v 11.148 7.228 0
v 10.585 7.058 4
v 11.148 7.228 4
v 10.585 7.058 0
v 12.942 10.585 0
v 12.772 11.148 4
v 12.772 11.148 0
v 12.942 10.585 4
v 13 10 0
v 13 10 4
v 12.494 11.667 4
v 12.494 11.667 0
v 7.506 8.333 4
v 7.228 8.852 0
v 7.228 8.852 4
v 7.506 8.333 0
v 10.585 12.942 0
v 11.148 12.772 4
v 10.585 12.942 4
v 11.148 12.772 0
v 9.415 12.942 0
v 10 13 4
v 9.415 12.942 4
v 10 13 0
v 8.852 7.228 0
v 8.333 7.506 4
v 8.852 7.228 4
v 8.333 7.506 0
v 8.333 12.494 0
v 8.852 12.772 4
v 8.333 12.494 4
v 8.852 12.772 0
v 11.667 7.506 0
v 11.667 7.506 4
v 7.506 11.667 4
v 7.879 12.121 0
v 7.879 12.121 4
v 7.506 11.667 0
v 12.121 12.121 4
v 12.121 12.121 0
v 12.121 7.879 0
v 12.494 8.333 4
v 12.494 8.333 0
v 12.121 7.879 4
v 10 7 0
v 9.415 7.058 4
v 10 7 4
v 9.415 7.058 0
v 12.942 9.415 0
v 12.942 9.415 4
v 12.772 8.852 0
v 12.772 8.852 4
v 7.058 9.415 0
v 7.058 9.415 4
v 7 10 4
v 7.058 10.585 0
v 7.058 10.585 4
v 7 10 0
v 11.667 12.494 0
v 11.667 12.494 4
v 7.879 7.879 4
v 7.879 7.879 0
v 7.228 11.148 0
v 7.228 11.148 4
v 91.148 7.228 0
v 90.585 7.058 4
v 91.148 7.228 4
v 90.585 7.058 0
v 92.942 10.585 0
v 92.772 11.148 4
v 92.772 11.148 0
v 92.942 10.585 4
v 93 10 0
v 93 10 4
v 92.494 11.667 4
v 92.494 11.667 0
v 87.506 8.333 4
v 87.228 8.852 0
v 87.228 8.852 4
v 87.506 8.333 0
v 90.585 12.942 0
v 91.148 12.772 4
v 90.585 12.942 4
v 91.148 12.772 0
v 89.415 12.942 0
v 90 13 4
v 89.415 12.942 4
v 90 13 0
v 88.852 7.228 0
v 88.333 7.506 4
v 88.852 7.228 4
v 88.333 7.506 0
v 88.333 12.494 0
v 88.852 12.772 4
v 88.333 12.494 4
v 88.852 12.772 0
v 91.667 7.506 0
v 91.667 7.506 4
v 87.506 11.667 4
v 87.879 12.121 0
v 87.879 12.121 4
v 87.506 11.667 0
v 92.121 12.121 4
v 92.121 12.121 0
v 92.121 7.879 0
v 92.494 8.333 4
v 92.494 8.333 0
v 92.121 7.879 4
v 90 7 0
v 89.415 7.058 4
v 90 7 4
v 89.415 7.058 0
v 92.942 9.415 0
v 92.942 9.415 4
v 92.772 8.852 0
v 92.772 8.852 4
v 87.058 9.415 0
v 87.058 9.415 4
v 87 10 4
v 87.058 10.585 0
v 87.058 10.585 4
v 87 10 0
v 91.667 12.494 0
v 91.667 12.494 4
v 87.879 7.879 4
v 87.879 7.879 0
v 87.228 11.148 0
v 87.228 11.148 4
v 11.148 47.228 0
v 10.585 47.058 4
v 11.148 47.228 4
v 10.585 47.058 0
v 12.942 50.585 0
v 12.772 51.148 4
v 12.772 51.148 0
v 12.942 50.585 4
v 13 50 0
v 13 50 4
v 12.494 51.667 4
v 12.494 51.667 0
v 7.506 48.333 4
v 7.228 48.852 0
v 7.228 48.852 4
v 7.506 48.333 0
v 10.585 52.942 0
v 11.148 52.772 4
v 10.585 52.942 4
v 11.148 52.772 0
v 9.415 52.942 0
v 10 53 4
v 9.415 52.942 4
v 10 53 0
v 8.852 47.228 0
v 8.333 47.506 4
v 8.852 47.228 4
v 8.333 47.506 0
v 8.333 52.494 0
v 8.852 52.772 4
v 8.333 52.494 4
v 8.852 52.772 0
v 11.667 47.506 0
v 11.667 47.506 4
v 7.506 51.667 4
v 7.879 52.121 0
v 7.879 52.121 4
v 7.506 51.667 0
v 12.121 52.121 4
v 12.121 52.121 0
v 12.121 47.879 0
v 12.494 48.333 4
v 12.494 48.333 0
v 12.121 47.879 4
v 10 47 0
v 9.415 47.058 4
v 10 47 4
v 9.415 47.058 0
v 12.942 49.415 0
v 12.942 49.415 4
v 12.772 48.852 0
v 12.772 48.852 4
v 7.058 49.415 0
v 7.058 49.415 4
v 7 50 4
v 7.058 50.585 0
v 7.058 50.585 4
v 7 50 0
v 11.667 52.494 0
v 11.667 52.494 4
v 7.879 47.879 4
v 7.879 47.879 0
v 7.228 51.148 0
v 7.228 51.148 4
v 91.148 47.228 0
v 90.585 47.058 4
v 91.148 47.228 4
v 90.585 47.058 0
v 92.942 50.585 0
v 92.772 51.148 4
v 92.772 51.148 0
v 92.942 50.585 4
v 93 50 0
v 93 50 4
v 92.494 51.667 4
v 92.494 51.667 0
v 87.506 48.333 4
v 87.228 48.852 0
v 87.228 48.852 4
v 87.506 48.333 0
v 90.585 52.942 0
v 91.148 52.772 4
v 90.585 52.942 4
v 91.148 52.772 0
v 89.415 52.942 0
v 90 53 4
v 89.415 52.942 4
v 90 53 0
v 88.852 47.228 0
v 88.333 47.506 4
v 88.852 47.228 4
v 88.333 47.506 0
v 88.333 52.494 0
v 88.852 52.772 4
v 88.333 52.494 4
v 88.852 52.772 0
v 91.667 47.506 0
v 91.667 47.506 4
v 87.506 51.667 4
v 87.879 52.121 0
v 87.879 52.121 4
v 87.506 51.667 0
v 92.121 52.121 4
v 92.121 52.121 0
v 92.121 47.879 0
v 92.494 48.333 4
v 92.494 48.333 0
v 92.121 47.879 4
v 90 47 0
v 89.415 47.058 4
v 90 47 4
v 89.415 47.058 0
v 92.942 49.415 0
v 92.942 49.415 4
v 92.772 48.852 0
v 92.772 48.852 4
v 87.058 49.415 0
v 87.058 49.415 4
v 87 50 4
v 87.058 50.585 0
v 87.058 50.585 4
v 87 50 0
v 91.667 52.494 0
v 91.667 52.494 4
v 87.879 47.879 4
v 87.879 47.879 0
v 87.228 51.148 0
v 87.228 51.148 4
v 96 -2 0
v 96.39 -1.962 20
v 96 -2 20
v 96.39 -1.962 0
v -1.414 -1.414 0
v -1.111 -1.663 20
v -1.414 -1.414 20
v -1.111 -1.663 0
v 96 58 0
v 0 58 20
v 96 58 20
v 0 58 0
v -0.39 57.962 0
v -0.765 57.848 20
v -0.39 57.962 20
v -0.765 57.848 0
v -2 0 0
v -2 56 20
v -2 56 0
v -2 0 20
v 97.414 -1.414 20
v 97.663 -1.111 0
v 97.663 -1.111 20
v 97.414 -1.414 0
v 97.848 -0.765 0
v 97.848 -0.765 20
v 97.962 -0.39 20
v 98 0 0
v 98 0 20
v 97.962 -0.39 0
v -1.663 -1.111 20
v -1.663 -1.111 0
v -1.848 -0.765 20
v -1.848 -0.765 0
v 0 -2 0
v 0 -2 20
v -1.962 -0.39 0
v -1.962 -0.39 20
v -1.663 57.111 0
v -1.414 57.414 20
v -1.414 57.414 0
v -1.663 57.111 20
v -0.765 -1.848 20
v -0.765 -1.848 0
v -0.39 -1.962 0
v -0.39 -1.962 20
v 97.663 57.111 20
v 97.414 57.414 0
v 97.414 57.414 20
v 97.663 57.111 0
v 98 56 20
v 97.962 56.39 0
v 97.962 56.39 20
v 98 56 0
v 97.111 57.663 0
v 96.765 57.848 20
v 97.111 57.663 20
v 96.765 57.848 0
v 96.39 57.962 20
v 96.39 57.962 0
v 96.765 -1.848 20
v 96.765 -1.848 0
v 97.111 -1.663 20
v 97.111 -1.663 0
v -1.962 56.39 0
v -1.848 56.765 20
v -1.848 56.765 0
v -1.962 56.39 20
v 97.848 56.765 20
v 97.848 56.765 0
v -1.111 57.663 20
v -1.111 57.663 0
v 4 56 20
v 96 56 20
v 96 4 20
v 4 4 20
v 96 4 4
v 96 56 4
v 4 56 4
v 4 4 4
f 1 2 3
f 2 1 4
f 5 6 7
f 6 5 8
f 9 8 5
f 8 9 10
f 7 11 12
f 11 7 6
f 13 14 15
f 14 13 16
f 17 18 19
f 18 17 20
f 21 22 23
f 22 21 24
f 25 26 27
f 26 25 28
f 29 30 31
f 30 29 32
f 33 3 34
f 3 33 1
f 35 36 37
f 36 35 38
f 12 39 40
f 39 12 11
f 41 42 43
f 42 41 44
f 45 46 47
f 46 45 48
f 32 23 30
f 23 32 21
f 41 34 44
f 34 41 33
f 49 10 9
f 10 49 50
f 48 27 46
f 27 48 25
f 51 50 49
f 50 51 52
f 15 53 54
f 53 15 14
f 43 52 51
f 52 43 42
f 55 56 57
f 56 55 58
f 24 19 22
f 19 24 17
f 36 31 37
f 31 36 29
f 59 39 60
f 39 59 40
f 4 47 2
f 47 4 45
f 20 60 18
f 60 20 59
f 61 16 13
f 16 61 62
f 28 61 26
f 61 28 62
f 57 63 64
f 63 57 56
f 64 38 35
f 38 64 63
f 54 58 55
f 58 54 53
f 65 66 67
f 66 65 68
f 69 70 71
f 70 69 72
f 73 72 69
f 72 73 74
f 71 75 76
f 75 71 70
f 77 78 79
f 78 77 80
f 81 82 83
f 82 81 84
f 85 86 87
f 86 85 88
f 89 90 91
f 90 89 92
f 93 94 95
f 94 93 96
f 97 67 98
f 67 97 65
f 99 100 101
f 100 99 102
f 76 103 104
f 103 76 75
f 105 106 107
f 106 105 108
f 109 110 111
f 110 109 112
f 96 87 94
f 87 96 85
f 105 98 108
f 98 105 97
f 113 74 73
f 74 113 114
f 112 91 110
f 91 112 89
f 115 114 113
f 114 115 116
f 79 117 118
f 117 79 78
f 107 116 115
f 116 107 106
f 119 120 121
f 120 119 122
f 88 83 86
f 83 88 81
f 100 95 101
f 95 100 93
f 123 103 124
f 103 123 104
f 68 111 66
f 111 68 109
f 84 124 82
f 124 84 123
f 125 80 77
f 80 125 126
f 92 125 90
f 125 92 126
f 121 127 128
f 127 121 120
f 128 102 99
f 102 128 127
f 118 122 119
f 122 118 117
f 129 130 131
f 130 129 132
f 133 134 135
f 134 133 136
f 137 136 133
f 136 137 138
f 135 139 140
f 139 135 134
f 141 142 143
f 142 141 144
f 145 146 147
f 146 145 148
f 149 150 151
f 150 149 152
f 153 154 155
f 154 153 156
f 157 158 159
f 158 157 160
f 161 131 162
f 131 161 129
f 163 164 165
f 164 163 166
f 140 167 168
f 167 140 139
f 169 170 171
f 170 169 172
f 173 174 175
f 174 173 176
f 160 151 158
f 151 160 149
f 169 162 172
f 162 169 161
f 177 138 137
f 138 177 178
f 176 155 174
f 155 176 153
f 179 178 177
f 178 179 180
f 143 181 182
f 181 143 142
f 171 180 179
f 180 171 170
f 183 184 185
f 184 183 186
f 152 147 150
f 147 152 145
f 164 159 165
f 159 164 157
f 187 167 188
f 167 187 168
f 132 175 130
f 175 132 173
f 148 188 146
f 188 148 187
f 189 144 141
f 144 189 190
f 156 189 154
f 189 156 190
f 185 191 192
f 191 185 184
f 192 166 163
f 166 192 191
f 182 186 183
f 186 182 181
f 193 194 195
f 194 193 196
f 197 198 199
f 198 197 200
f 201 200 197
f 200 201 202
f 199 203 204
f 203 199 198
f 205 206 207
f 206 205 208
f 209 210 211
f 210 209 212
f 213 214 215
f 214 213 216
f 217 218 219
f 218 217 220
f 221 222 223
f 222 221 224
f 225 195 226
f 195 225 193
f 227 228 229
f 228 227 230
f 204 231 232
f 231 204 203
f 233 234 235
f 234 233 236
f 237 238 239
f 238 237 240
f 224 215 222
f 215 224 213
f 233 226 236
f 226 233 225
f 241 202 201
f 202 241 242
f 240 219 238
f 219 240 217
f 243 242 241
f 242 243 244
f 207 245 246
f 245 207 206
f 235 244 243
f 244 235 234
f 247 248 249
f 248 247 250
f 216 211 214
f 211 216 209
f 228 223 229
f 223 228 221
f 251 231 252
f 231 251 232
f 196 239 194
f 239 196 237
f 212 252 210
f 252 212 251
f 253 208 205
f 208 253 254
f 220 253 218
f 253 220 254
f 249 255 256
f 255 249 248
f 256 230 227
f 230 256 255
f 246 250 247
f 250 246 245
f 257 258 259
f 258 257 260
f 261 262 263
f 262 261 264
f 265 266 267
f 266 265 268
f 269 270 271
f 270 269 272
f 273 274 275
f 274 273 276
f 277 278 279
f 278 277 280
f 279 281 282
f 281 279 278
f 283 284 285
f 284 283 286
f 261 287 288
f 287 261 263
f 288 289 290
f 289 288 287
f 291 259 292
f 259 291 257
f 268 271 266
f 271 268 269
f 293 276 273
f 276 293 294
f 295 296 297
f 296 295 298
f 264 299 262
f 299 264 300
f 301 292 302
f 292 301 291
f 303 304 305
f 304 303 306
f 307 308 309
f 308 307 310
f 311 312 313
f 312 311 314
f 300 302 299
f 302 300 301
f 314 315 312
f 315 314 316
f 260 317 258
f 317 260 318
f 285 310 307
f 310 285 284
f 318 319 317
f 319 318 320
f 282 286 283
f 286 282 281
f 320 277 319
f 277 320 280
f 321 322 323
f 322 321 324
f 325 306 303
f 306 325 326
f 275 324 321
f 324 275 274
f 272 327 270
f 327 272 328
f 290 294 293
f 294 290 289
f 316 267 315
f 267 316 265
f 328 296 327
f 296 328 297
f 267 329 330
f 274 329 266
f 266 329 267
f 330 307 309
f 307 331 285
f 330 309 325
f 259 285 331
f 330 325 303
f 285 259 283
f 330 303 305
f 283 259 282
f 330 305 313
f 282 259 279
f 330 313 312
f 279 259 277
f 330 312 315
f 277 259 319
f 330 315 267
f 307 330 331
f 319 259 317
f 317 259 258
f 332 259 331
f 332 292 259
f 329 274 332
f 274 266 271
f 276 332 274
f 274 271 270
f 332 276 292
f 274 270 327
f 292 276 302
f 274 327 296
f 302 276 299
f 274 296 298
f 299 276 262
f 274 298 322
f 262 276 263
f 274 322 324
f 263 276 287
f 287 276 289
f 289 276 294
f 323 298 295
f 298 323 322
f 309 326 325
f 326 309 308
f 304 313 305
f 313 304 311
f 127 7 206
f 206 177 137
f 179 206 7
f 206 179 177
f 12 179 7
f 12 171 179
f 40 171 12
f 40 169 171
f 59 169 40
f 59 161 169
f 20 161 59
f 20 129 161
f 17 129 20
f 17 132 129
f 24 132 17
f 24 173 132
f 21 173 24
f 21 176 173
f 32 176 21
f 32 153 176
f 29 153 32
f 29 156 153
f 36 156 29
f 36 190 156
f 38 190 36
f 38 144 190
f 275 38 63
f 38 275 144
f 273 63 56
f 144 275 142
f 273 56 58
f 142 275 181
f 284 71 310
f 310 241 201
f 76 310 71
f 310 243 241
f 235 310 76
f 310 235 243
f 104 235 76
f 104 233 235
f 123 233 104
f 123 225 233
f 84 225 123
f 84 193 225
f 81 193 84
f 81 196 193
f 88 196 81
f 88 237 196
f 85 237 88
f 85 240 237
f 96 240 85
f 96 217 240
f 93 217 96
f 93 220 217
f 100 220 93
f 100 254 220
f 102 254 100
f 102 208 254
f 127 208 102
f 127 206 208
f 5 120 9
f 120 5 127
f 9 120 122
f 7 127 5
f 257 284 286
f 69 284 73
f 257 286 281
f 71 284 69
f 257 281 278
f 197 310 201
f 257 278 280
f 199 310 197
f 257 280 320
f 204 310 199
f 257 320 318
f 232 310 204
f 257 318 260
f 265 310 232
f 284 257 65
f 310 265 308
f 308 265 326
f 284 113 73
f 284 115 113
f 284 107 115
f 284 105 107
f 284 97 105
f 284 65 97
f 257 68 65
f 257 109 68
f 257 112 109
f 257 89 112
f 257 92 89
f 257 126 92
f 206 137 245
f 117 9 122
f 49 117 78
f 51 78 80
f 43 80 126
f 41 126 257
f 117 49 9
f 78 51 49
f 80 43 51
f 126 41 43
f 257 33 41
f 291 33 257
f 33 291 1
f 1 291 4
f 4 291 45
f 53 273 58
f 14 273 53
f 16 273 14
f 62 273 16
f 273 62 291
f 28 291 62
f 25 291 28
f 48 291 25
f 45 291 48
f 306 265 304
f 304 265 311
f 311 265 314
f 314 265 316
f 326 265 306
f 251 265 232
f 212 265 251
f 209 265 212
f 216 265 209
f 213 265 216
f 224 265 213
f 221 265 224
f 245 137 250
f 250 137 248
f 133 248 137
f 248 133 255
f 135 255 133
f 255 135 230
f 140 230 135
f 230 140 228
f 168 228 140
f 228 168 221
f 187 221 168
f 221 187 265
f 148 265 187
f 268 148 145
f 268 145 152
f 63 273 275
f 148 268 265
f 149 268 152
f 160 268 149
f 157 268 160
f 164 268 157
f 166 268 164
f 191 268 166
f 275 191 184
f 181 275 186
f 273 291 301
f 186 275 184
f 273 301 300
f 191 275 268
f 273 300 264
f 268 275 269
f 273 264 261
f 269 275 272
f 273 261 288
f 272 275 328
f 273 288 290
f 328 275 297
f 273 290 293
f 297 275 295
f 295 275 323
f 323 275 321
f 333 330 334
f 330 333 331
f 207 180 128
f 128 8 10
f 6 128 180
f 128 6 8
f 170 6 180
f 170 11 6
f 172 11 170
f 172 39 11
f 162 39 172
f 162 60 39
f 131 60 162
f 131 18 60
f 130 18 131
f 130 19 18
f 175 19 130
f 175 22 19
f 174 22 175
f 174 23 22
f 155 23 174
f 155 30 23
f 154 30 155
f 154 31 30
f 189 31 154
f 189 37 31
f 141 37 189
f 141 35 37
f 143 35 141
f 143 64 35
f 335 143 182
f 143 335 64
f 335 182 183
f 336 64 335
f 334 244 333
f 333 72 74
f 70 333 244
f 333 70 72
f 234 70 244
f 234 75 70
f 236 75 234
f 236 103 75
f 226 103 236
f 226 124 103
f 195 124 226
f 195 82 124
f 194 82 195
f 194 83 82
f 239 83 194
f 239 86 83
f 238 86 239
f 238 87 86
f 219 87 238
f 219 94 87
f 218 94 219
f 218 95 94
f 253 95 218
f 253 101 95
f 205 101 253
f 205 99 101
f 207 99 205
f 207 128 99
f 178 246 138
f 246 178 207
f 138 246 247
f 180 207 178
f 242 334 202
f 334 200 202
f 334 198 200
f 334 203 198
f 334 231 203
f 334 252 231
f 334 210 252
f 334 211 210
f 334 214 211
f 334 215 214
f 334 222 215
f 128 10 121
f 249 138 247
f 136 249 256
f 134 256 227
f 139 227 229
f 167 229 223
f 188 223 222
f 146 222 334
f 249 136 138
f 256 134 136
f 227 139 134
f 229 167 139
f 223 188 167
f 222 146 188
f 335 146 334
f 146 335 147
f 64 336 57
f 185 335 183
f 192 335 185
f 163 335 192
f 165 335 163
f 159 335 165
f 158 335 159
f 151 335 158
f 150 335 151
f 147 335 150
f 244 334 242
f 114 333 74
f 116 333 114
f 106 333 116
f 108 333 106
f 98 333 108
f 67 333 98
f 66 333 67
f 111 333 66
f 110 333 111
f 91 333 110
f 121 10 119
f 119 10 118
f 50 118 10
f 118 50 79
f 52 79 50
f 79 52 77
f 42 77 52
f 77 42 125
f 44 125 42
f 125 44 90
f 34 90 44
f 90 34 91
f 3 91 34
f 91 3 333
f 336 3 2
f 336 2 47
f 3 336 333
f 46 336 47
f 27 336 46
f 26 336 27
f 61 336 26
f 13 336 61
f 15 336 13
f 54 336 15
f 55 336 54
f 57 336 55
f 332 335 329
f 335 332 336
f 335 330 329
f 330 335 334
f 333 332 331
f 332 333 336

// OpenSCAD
// scad/base_part.scad
// Parametric mounting bracket.
// All caps variables are injected via -D flags from openscad_runner.py.
// Do not hardcode dimensions here — edit scad/params.json instead.

// ── Parameters (defaults match scad/params.json) ──────────────────────────
LENGTH                 = 100.0;
WIDTH                  = 60.0;
HEIGHT                 = 20.0;
WALL_THICKNESS         = 4.0;
FILLET_RADIUS          = 2.0;
MOUNTING_HOLE_DIAMETER = 6.0;
MOUNTING_HOLE_INSET    = 10.0;

// ── Derived values ─────────────────────────────────────────────────────────
hole_r   = MOUNTING_HOLE_DIAMETER / 2;
fn_curve = 32;  // cylinder facets — increase for smoother export

// ── Main body ──────────────────────────────────────────────────────────────
module body() {
    minkowski() {
        cube([
            LENGTH - 2 * FILLET_RADIUS,
            WIDTH  - 2 * FILLET_RADIUS,
            HEIGHT - FILLET_RADIUS
        ]);
        cylinder(r=FILLET_RADIUS, h=FILLET_RADIUS, $fn=fn_curve);
    }
}

// ── Mounting holes (4 corners) ─────────────────────────────────────────────
module mounting_holes() {
    inset = MOUNTING_HOLE_INSET;
    positions = [
        [inset,          inset         ],
        [LENGTH - inset, inset         ],
        [inset,          WIDTH - inset ],
        [LENGTH - inset, WIDTH - inset ],
    ];
    for (pos = positions) {
        translate([pos[0], pos[1], -1])
            cylinder(r=hole_r, h=HEIGHT + 2, $fn=fn_curve);
    }
}

// ── Hollowed interior (shell thickness = WALL_THICKNESS) ───────────────────
module hollow() {
    translate([WALL_THICKNESS, WALL_THICKNESS, WALL_THICKNESS])
        cube([
            LENGTH - 2 * WALL_THICKNESS,
            WIDTH  - 2 * WALL_THICKNESS,
            HEIGHT
        ]);
}

// ── Assembly ───────────────────────────────────────────────────────────────
difference() {
    body();
    hollow();
    mounting_holes();
}
